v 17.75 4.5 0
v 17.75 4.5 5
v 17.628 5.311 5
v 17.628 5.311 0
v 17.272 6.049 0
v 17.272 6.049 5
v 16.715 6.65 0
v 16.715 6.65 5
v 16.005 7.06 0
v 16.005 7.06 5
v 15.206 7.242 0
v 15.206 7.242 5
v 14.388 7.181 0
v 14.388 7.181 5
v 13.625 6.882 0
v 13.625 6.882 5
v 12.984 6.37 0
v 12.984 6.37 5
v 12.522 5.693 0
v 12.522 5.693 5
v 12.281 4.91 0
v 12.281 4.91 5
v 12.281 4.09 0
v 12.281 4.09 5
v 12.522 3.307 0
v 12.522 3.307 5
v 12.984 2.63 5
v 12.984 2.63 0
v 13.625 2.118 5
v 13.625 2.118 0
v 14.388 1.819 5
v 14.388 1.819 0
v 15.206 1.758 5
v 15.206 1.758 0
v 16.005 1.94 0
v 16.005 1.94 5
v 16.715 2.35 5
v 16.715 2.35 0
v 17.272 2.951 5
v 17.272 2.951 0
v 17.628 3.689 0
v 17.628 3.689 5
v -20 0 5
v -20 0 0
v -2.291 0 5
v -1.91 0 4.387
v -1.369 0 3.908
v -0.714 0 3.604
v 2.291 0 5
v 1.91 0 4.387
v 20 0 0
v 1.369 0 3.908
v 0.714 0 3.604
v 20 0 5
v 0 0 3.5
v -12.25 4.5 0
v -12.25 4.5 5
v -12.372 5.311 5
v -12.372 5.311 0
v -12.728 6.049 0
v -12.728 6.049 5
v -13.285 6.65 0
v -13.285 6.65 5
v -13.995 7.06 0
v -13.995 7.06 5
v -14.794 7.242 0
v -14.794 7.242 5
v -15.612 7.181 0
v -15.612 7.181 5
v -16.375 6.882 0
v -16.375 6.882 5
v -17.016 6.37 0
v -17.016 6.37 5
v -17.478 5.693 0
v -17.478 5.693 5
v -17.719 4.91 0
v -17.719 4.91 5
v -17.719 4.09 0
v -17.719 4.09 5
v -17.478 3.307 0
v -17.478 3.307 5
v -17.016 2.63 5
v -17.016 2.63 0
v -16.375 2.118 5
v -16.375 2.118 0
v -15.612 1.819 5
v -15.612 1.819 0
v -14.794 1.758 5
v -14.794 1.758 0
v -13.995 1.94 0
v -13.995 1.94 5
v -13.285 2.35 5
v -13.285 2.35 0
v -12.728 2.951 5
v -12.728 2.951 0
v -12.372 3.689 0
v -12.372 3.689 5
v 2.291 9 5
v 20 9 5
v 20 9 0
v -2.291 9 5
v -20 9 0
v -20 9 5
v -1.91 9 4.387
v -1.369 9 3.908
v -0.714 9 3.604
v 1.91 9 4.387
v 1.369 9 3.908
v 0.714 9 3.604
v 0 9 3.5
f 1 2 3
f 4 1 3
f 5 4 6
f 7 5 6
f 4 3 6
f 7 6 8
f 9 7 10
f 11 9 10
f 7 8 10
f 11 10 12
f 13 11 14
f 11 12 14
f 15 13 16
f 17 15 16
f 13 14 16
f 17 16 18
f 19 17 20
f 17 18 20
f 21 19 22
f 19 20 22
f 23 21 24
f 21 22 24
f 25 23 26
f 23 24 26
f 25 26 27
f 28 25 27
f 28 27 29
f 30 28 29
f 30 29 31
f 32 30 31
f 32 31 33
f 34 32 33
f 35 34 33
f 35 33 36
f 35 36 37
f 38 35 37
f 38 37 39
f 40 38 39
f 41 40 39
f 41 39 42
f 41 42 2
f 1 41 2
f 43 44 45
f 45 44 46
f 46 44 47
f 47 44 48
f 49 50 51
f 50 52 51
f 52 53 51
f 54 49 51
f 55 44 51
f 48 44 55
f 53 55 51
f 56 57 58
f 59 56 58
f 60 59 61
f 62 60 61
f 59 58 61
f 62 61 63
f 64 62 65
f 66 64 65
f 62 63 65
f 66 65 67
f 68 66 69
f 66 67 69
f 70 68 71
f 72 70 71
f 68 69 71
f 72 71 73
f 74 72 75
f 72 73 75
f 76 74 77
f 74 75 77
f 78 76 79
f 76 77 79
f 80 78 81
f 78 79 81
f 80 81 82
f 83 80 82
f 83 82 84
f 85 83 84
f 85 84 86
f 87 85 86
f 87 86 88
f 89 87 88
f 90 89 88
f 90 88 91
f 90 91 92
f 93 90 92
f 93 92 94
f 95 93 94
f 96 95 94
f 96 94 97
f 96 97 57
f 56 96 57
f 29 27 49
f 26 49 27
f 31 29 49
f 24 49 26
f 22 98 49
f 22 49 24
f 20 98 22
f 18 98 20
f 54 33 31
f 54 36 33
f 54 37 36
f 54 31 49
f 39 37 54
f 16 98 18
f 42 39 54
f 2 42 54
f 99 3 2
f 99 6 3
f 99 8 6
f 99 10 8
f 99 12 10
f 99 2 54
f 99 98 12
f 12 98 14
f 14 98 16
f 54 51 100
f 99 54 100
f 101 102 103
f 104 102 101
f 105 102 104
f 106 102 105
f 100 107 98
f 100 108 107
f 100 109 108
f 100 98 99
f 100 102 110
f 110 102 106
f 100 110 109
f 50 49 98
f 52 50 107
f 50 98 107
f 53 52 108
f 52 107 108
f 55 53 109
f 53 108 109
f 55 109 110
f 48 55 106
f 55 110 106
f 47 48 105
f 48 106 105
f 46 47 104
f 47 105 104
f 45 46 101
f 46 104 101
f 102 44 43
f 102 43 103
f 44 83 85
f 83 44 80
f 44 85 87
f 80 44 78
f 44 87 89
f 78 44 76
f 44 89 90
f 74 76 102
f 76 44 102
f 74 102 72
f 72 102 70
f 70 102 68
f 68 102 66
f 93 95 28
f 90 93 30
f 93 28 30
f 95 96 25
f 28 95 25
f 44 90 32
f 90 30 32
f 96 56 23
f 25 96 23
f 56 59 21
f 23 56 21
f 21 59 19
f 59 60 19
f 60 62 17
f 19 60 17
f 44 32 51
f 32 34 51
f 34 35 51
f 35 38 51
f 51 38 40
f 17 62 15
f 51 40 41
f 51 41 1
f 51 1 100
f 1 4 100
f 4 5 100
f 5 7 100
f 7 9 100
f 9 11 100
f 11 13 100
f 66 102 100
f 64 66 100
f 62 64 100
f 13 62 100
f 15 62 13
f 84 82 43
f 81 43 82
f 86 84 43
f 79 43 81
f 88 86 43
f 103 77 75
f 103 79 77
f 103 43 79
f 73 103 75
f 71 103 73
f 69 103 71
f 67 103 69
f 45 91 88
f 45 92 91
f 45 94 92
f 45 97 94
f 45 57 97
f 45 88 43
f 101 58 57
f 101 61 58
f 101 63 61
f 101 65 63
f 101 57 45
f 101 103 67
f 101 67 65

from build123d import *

# Parameters (mm, degrees)
SKETCH_1_W          = 40
SKETCH_1_H          = 9
EXTRUDE_1_DEPTH     = 5
SKETCH_2_R          = 2.75
CUT_EXTRUDE_1_DEPTH = 10
SKETCH_3_R          = 2.5
CUT_EXTRUDE_2_DEPTH = 10


with BuildPart() as part:
    # 草图1 → 凸台-拉伸1 (new body)
    with BuildSketch(Plane.XY):
        with Locations((0, 4.5)):
            Rectangle(SKETCH_1_W, SKETCH_1_H)
    extrude(amount=EXTRUDE_1_DEPTH)

    # 草图2 → 切除-拉伸1 (cut)
    with BuildSketch(Plane.XY.offset(5)):
        with Locations((15, 4.5)):
            Circle(SKETCH_2_R)
        with Locations((-15, 4.5)):
            Circle(SKETCH_2_R)
    extrude(amount=-CUT_EXTRUDE_1_DEPTH, mode=Mode.SUBTRACT)

    # 草图3 → 切除-拉伸2 (cut)
    with BuildSketch(Plane(origin=(0, 9, 0), x_dir=(1, 0, 0), z_dir=(0, 1, 0))):
        with Locations((0, -6)):
            Circle(SKETCH_3_R)
    extrude(amount=-CUT_EXTRUDE_2_DEPTH, mode=Mode.SUBTRACT)


solid = part.part
